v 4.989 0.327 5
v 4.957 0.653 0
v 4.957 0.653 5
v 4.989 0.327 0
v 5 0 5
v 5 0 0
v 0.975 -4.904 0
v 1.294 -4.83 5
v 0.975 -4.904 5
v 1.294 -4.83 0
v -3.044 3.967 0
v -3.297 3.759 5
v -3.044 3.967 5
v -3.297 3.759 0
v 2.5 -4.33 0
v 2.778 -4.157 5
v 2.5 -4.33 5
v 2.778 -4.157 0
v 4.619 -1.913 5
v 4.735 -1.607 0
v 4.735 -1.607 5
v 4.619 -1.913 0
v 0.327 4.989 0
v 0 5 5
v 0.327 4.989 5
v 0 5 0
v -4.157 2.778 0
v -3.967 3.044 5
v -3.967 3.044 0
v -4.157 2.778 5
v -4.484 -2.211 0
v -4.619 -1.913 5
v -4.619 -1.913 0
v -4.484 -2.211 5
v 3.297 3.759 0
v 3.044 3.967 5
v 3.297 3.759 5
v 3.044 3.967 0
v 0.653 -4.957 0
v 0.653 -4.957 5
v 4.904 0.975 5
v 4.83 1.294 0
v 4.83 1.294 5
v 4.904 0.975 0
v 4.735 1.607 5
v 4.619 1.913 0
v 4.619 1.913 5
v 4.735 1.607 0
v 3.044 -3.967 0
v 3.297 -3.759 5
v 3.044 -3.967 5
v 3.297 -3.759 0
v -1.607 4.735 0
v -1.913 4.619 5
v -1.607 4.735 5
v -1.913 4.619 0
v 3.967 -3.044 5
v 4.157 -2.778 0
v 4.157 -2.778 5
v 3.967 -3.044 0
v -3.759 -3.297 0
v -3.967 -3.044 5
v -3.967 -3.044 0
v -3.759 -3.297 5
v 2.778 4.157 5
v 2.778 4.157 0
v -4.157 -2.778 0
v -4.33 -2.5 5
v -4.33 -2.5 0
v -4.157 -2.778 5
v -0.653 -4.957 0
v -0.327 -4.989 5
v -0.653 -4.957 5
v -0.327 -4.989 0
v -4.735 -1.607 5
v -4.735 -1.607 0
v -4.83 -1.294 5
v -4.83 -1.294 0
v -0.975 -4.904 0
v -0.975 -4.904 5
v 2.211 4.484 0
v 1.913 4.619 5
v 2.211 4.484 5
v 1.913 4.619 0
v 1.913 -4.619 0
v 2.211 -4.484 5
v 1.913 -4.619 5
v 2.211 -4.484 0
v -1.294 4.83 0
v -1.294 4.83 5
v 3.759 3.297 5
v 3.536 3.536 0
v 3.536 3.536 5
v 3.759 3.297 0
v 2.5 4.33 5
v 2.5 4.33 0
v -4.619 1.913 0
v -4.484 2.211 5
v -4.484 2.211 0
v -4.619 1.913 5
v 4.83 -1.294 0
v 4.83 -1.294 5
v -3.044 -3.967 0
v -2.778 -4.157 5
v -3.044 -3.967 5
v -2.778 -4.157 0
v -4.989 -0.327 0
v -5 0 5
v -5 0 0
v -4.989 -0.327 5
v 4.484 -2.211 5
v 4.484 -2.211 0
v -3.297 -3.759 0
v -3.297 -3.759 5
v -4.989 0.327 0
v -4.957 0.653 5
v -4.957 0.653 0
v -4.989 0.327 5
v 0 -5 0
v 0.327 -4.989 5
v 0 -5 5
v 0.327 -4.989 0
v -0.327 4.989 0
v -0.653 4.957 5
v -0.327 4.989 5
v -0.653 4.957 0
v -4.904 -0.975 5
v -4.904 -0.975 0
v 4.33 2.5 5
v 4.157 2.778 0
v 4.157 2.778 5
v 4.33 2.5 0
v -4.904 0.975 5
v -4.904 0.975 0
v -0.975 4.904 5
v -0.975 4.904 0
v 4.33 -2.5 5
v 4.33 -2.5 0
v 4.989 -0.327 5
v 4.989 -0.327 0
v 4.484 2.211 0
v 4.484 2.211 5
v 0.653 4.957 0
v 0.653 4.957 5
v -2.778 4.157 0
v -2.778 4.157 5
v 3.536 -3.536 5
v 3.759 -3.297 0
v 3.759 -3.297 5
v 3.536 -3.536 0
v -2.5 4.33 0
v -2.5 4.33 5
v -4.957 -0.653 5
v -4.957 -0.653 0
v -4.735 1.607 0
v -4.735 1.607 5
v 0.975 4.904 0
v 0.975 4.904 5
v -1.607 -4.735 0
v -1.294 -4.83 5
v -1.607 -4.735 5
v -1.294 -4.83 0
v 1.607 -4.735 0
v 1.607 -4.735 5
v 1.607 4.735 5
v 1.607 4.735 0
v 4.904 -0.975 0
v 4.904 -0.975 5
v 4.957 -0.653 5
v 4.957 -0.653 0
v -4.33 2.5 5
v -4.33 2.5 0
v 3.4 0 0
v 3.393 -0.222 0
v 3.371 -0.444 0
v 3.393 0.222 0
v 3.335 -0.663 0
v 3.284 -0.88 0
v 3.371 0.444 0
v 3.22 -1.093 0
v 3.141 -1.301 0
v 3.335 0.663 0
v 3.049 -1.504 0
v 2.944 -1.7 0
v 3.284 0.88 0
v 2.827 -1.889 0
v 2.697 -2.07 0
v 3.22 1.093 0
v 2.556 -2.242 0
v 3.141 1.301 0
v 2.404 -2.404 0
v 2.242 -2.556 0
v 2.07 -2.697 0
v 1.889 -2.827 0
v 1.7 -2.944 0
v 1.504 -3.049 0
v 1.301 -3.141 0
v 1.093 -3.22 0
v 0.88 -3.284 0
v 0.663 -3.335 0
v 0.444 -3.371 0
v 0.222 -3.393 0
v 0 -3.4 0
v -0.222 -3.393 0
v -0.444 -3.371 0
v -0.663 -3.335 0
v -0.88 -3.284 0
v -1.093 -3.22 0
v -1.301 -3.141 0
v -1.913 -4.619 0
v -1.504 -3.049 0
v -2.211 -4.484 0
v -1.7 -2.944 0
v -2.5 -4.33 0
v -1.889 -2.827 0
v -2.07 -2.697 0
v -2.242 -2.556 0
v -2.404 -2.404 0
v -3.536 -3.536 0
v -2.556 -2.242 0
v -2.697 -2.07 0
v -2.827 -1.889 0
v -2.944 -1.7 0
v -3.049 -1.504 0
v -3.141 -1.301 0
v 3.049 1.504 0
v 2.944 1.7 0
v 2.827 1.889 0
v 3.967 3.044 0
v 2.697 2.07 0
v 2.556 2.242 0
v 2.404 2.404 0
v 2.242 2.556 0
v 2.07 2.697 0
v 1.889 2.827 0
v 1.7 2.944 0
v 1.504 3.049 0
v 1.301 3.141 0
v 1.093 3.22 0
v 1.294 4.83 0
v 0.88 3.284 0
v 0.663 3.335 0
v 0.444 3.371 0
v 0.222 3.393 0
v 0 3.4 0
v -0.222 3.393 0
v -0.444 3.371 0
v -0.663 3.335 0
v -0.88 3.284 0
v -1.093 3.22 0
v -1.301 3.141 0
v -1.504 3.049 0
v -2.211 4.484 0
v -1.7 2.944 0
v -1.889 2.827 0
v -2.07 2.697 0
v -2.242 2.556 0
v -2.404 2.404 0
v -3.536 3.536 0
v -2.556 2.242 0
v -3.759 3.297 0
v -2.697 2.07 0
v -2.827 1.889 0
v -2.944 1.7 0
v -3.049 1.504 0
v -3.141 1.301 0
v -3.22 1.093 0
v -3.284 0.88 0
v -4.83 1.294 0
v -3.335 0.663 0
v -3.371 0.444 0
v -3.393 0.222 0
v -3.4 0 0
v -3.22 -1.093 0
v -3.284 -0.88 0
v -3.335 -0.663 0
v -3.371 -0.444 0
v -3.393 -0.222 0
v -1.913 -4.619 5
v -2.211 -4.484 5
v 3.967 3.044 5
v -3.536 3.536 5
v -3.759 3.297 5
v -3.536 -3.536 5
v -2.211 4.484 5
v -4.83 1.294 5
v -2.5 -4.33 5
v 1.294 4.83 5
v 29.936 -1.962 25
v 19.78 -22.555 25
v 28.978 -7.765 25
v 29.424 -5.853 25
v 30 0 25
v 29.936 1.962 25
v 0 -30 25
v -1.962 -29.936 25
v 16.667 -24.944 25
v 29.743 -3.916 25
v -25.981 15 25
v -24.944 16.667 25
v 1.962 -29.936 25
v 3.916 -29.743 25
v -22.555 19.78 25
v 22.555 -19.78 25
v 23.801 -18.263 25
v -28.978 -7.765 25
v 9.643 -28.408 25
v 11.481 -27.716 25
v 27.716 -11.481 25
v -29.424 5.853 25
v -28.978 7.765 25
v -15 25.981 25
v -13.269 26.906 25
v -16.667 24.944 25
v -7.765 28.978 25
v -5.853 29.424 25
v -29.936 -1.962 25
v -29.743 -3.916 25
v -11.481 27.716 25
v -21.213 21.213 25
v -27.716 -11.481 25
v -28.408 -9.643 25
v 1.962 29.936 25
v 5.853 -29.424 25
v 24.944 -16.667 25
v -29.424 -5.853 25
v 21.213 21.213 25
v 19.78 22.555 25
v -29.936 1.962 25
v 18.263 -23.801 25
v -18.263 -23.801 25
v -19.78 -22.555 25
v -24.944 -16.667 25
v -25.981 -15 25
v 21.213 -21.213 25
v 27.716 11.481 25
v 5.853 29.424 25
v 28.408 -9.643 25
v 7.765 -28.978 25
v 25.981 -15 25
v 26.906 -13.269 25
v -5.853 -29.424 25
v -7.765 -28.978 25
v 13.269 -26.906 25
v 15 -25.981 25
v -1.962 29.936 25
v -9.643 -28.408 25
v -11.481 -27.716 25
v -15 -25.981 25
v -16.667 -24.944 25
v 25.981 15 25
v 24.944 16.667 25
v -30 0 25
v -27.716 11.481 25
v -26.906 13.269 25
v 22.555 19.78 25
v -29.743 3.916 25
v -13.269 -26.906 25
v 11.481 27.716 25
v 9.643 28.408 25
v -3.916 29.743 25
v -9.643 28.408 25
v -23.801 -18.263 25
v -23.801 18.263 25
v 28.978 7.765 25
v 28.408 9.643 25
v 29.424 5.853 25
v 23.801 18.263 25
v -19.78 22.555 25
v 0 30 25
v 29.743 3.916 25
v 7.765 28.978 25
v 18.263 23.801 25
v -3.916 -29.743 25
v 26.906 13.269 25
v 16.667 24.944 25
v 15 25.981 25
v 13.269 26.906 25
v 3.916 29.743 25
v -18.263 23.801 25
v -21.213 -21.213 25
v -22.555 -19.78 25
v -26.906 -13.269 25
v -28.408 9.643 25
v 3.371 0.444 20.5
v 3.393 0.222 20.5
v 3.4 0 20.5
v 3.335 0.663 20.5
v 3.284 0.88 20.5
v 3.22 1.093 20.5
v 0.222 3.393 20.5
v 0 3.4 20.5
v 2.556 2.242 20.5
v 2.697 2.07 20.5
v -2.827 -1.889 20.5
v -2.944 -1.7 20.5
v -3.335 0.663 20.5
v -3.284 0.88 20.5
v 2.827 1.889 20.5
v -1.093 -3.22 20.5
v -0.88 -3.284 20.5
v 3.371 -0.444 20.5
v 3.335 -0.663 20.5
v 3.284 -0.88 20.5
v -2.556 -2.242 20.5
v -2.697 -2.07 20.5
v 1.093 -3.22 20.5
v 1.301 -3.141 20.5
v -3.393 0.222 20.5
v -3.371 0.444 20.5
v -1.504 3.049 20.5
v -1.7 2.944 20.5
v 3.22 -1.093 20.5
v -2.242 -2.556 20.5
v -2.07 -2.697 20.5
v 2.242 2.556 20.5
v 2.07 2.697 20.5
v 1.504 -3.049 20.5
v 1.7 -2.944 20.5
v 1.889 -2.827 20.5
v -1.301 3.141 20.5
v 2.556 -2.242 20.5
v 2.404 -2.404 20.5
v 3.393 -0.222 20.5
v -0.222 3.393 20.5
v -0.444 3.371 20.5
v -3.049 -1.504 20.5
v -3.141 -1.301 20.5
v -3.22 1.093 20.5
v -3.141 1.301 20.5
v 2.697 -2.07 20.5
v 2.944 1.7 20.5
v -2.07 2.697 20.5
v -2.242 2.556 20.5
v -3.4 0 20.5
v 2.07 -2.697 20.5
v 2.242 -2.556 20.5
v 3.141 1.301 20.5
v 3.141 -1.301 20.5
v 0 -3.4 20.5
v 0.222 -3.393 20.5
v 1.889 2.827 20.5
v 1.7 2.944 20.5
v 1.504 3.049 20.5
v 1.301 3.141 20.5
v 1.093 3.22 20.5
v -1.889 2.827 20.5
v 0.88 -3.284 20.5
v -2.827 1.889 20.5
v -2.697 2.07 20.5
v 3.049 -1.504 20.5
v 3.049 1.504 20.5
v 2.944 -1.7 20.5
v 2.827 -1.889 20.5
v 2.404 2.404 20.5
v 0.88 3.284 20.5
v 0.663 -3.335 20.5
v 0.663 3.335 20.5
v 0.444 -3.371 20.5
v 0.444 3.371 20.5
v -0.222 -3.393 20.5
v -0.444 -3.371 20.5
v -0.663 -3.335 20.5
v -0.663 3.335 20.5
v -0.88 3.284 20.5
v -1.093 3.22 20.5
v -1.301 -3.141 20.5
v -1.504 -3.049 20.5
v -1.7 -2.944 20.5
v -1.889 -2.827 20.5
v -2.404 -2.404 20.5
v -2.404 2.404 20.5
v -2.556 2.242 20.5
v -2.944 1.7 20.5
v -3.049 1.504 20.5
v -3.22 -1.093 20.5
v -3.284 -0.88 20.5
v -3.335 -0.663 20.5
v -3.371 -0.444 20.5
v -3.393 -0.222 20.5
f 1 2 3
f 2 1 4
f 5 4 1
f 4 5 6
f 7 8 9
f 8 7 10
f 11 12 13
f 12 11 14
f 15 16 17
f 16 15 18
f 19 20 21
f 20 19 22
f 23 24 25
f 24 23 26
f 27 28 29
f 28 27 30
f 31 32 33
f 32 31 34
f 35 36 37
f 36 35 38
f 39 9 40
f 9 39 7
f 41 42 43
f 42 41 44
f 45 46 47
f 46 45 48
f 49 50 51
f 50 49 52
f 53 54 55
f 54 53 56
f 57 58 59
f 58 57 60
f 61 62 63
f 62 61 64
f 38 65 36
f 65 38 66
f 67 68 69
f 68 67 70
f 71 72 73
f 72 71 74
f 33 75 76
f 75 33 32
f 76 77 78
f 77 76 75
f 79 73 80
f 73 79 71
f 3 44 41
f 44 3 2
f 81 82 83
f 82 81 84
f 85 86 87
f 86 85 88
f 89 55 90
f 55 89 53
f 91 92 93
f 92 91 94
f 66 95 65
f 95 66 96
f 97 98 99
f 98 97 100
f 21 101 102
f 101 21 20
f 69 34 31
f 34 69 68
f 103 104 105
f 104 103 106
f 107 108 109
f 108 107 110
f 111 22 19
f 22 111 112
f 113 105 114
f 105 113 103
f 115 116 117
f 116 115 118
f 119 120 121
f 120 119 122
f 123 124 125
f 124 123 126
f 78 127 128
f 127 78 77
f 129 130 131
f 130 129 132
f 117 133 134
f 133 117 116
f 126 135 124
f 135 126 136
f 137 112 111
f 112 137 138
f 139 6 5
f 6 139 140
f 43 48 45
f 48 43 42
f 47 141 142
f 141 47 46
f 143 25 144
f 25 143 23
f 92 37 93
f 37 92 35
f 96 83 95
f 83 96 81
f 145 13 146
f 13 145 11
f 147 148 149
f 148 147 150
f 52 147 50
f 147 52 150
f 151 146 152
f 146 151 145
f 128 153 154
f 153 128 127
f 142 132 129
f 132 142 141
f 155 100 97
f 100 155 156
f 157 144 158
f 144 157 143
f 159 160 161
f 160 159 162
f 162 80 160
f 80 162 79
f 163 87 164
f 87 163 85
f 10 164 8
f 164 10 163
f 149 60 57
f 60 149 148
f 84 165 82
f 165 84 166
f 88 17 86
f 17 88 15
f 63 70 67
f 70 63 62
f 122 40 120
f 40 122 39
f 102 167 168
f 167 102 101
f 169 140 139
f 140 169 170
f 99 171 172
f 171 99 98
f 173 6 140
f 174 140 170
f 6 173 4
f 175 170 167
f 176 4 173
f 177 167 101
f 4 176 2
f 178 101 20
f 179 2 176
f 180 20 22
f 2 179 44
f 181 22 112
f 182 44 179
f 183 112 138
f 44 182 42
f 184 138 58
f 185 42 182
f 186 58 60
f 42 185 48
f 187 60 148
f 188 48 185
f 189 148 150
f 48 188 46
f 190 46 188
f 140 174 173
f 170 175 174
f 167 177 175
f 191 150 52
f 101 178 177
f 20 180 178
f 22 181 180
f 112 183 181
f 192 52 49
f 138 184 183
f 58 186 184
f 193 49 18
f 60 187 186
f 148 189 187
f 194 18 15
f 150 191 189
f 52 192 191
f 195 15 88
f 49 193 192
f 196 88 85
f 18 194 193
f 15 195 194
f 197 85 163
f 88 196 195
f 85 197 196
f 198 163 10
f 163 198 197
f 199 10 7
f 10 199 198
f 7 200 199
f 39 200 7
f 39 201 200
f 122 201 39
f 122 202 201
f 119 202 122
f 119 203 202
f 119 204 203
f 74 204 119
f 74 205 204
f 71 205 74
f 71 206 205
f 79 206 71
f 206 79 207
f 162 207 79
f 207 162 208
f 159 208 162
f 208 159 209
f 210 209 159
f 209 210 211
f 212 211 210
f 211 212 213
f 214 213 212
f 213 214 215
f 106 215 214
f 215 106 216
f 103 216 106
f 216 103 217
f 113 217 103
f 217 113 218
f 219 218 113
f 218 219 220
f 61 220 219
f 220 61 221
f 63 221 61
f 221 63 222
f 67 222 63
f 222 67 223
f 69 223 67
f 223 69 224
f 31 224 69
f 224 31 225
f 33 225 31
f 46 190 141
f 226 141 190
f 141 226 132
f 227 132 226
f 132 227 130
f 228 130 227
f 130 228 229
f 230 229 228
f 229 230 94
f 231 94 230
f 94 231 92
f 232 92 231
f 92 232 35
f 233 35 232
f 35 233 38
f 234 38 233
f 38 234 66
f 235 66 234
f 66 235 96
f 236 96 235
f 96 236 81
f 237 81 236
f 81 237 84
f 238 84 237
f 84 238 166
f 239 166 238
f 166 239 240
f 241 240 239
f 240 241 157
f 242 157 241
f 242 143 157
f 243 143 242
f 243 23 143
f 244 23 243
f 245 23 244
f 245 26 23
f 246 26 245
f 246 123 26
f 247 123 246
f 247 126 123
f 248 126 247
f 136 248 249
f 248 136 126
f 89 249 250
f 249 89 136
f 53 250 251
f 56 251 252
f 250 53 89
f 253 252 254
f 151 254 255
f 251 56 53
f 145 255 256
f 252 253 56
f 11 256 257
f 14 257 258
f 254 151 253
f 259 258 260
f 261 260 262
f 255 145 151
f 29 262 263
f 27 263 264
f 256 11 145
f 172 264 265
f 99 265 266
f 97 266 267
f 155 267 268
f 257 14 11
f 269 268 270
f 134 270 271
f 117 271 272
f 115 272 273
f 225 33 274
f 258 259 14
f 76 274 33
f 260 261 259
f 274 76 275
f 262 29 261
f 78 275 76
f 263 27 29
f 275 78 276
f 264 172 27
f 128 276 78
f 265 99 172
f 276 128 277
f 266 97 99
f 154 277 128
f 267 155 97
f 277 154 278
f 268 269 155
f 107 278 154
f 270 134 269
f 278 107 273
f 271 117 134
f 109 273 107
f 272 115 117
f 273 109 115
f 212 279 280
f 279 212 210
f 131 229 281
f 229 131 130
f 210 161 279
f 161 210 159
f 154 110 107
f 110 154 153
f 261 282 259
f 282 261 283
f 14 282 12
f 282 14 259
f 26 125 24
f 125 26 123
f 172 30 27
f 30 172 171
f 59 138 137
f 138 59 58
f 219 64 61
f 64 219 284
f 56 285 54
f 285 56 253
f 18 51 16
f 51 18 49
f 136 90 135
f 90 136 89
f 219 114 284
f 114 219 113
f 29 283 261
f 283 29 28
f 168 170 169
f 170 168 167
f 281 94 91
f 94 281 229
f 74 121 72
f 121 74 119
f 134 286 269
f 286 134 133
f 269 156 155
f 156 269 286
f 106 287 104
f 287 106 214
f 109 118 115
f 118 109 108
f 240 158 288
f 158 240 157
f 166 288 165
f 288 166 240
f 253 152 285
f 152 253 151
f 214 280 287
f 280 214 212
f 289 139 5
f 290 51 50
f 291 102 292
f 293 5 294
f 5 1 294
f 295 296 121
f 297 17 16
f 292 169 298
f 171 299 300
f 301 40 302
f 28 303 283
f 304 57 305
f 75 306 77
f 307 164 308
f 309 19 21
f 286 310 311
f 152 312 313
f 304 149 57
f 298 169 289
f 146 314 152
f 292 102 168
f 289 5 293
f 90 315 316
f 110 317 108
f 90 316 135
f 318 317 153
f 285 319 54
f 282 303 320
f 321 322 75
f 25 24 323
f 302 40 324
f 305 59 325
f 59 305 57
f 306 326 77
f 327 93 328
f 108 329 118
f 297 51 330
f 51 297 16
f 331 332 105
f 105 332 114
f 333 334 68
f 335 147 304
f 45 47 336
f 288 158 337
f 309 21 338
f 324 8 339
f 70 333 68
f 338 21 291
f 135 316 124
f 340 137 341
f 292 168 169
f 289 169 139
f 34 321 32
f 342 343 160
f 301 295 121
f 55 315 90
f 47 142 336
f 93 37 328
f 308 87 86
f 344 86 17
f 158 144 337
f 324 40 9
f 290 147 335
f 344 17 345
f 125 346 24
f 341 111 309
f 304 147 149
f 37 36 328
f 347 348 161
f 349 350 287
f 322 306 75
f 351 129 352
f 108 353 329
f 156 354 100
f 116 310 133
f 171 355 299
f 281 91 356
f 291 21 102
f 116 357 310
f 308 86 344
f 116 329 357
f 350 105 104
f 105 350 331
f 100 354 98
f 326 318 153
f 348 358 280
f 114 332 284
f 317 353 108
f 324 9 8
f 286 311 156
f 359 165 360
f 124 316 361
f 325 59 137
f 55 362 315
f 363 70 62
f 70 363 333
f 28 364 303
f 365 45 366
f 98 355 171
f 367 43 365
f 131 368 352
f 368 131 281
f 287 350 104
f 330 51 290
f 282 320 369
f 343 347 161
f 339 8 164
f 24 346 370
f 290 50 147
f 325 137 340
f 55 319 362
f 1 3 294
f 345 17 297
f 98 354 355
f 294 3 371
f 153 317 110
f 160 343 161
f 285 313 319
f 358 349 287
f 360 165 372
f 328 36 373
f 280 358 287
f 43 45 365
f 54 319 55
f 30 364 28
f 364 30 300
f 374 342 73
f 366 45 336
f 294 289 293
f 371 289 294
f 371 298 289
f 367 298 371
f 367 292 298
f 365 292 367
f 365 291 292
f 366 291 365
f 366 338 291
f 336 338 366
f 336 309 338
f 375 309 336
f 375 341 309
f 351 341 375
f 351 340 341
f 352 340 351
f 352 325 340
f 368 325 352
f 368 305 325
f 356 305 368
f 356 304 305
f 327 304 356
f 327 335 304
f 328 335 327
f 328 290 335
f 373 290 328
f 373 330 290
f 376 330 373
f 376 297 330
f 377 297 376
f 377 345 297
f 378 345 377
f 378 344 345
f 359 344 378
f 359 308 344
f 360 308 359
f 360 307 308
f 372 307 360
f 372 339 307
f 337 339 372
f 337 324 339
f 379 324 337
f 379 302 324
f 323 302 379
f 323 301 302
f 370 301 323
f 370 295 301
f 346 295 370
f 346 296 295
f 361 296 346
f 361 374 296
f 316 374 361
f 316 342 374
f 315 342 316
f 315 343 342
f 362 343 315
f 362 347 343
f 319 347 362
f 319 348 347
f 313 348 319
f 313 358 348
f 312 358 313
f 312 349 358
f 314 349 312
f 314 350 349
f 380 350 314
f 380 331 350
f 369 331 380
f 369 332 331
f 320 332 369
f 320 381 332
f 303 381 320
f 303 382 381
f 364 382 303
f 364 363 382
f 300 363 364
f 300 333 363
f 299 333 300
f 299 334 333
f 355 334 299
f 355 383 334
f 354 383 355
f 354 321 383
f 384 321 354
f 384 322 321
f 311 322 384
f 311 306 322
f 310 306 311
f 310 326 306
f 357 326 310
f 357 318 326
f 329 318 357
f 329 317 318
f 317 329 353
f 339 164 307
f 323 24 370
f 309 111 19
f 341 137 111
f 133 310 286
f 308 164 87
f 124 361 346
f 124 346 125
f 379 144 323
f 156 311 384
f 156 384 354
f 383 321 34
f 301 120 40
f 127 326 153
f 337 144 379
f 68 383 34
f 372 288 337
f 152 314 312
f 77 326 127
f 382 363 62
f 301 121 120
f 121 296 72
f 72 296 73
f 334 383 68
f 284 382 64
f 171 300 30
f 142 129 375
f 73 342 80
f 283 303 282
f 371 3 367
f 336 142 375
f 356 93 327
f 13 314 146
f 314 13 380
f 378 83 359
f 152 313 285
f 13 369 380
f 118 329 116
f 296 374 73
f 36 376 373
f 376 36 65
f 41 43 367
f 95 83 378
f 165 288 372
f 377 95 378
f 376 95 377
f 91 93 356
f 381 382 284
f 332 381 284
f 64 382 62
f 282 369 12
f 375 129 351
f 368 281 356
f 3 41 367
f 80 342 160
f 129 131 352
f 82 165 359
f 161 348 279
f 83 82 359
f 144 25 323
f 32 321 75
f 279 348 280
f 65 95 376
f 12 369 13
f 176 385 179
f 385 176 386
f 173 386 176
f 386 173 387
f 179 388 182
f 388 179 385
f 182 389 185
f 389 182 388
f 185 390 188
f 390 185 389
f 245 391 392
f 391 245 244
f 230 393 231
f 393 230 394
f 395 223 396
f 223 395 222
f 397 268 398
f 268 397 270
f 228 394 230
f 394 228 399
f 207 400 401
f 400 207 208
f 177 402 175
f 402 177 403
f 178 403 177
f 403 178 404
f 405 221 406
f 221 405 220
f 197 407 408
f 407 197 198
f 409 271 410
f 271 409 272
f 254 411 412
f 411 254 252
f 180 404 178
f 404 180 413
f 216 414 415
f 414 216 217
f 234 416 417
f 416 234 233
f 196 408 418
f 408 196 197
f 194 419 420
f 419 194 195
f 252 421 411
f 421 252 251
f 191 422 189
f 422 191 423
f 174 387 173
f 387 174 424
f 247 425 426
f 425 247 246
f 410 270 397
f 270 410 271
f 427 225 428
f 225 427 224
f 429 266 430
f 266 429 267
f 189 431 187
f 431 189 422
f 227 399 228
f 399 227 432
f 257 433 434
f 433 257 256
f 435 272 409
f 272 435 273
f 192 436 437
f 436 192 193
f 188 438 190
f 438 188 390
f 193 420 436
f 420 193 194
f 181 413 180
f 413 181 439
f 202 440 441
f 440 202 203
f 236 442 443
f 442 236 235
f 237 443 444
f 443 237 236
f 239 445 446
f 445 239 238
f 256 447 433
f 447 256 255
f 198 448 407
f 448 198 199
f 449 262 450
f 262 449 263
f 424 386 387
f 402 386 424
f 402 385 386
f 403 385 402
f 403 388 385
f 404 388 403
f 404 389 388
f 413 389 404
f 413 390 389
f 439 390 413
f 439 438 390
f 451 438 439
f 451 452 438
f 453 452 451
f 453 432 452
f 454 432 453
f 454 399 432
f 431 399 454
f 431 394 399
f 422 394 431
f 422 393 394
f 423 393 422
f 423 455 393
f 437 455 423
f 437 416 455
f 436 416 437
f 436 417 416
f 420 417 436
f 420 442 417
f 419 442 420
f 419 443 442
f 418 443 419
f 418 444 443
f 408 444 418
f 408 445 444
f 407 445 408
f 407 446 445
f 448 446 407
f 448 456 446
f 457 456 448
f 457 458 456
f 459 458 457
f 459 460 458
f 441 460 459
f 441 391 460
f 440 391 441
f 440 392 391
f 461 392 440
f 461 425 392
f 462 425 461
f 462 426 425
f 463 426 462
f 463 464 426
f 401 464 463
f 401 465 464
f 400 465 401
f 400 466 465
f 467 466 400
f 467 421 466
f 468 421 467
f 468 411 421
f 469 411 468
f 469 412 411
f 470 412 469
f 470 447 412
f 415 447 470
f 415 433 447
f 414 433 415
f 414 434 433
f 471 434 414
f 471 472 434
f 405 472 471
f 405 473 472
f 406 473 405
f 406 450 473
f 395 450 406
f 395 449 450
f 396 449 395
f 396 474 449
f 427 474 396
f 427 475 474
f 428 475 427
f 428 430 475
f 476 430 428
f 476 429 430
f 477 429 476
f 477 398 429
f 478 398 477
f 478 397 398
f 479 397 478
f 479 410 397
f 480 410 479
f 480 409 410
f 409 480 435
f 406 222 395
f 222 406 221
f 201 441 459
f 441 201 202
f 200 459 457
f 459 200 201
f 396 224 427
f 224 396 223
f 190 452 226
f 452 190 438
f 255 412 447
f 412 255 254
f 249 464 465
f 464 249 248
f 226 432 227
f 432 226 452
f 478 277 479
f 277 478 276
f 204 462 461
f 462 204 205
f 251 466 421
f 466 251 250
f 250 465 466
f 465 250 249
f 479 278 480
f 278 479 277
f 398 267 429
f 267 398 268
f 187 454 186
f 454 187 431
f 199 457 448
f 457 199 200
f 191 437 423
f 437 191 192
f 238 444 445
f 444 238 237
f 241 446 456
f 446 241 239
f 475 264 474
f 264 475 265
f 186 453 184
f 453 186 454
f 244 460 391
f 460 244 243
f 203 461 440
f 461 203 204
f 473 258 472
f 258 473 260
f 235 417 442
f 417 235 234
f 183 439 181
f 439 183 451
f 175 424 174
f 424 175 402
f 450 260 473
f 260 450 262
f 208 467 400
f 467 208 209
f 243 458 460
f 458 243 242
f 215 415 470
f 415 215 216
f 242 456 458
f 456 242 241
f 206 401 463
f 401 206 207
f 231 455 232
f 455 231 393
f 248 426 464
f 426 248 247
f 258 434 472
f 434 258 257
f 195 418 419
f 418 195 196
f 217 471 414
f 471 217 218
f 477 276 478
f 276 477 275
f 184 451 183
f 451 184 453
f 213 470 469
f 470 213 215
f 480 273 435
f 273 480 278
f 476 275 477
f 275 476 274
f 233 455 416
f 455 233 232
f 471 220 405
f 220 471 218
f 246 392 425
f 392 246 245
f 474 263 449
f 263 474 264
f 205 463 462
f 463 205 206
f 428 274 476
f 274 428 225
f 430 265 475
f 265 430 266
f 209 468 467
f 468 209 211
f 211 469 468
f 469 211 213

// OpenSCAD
// Lab funnel - printed upright, open at top and bottom
// Units: mm

// ---- Parameters ----
spout_od      = 10;    // spout outer diameter
spout_len     = 20;    // spout length (z = 0 to 20)
cone_od_top   = 60;    // cone rim outer diameter (z = 50)
cone_od_bot   = 10;    // cone base outer diameter (z = 20)
wall          = 1.6;   // wall thickness everywhere
eps           = 0.5;   // cutter overshoot past faces

$fn = 96;

// ---- Model ----
difference() {
    union() {
        // Spout (tube)
        translate([0, 0, 0])
            cylinder(d = spout_od, h = spout_len);

        // Cone from z = 20 to z = 50
        translate([0, 0, cone_od_bot / 2])
            cylinder(d1 = spout_od, d2 = cone_od_top, h = spout_len);
    }

    // Through-bore: spout bore (6.8 mm) extended past both ends
    translate([0, 0, -eps])
        cylinder(d = spout_od - 2 * wall, h = spout_len + 2 * eps);
}
